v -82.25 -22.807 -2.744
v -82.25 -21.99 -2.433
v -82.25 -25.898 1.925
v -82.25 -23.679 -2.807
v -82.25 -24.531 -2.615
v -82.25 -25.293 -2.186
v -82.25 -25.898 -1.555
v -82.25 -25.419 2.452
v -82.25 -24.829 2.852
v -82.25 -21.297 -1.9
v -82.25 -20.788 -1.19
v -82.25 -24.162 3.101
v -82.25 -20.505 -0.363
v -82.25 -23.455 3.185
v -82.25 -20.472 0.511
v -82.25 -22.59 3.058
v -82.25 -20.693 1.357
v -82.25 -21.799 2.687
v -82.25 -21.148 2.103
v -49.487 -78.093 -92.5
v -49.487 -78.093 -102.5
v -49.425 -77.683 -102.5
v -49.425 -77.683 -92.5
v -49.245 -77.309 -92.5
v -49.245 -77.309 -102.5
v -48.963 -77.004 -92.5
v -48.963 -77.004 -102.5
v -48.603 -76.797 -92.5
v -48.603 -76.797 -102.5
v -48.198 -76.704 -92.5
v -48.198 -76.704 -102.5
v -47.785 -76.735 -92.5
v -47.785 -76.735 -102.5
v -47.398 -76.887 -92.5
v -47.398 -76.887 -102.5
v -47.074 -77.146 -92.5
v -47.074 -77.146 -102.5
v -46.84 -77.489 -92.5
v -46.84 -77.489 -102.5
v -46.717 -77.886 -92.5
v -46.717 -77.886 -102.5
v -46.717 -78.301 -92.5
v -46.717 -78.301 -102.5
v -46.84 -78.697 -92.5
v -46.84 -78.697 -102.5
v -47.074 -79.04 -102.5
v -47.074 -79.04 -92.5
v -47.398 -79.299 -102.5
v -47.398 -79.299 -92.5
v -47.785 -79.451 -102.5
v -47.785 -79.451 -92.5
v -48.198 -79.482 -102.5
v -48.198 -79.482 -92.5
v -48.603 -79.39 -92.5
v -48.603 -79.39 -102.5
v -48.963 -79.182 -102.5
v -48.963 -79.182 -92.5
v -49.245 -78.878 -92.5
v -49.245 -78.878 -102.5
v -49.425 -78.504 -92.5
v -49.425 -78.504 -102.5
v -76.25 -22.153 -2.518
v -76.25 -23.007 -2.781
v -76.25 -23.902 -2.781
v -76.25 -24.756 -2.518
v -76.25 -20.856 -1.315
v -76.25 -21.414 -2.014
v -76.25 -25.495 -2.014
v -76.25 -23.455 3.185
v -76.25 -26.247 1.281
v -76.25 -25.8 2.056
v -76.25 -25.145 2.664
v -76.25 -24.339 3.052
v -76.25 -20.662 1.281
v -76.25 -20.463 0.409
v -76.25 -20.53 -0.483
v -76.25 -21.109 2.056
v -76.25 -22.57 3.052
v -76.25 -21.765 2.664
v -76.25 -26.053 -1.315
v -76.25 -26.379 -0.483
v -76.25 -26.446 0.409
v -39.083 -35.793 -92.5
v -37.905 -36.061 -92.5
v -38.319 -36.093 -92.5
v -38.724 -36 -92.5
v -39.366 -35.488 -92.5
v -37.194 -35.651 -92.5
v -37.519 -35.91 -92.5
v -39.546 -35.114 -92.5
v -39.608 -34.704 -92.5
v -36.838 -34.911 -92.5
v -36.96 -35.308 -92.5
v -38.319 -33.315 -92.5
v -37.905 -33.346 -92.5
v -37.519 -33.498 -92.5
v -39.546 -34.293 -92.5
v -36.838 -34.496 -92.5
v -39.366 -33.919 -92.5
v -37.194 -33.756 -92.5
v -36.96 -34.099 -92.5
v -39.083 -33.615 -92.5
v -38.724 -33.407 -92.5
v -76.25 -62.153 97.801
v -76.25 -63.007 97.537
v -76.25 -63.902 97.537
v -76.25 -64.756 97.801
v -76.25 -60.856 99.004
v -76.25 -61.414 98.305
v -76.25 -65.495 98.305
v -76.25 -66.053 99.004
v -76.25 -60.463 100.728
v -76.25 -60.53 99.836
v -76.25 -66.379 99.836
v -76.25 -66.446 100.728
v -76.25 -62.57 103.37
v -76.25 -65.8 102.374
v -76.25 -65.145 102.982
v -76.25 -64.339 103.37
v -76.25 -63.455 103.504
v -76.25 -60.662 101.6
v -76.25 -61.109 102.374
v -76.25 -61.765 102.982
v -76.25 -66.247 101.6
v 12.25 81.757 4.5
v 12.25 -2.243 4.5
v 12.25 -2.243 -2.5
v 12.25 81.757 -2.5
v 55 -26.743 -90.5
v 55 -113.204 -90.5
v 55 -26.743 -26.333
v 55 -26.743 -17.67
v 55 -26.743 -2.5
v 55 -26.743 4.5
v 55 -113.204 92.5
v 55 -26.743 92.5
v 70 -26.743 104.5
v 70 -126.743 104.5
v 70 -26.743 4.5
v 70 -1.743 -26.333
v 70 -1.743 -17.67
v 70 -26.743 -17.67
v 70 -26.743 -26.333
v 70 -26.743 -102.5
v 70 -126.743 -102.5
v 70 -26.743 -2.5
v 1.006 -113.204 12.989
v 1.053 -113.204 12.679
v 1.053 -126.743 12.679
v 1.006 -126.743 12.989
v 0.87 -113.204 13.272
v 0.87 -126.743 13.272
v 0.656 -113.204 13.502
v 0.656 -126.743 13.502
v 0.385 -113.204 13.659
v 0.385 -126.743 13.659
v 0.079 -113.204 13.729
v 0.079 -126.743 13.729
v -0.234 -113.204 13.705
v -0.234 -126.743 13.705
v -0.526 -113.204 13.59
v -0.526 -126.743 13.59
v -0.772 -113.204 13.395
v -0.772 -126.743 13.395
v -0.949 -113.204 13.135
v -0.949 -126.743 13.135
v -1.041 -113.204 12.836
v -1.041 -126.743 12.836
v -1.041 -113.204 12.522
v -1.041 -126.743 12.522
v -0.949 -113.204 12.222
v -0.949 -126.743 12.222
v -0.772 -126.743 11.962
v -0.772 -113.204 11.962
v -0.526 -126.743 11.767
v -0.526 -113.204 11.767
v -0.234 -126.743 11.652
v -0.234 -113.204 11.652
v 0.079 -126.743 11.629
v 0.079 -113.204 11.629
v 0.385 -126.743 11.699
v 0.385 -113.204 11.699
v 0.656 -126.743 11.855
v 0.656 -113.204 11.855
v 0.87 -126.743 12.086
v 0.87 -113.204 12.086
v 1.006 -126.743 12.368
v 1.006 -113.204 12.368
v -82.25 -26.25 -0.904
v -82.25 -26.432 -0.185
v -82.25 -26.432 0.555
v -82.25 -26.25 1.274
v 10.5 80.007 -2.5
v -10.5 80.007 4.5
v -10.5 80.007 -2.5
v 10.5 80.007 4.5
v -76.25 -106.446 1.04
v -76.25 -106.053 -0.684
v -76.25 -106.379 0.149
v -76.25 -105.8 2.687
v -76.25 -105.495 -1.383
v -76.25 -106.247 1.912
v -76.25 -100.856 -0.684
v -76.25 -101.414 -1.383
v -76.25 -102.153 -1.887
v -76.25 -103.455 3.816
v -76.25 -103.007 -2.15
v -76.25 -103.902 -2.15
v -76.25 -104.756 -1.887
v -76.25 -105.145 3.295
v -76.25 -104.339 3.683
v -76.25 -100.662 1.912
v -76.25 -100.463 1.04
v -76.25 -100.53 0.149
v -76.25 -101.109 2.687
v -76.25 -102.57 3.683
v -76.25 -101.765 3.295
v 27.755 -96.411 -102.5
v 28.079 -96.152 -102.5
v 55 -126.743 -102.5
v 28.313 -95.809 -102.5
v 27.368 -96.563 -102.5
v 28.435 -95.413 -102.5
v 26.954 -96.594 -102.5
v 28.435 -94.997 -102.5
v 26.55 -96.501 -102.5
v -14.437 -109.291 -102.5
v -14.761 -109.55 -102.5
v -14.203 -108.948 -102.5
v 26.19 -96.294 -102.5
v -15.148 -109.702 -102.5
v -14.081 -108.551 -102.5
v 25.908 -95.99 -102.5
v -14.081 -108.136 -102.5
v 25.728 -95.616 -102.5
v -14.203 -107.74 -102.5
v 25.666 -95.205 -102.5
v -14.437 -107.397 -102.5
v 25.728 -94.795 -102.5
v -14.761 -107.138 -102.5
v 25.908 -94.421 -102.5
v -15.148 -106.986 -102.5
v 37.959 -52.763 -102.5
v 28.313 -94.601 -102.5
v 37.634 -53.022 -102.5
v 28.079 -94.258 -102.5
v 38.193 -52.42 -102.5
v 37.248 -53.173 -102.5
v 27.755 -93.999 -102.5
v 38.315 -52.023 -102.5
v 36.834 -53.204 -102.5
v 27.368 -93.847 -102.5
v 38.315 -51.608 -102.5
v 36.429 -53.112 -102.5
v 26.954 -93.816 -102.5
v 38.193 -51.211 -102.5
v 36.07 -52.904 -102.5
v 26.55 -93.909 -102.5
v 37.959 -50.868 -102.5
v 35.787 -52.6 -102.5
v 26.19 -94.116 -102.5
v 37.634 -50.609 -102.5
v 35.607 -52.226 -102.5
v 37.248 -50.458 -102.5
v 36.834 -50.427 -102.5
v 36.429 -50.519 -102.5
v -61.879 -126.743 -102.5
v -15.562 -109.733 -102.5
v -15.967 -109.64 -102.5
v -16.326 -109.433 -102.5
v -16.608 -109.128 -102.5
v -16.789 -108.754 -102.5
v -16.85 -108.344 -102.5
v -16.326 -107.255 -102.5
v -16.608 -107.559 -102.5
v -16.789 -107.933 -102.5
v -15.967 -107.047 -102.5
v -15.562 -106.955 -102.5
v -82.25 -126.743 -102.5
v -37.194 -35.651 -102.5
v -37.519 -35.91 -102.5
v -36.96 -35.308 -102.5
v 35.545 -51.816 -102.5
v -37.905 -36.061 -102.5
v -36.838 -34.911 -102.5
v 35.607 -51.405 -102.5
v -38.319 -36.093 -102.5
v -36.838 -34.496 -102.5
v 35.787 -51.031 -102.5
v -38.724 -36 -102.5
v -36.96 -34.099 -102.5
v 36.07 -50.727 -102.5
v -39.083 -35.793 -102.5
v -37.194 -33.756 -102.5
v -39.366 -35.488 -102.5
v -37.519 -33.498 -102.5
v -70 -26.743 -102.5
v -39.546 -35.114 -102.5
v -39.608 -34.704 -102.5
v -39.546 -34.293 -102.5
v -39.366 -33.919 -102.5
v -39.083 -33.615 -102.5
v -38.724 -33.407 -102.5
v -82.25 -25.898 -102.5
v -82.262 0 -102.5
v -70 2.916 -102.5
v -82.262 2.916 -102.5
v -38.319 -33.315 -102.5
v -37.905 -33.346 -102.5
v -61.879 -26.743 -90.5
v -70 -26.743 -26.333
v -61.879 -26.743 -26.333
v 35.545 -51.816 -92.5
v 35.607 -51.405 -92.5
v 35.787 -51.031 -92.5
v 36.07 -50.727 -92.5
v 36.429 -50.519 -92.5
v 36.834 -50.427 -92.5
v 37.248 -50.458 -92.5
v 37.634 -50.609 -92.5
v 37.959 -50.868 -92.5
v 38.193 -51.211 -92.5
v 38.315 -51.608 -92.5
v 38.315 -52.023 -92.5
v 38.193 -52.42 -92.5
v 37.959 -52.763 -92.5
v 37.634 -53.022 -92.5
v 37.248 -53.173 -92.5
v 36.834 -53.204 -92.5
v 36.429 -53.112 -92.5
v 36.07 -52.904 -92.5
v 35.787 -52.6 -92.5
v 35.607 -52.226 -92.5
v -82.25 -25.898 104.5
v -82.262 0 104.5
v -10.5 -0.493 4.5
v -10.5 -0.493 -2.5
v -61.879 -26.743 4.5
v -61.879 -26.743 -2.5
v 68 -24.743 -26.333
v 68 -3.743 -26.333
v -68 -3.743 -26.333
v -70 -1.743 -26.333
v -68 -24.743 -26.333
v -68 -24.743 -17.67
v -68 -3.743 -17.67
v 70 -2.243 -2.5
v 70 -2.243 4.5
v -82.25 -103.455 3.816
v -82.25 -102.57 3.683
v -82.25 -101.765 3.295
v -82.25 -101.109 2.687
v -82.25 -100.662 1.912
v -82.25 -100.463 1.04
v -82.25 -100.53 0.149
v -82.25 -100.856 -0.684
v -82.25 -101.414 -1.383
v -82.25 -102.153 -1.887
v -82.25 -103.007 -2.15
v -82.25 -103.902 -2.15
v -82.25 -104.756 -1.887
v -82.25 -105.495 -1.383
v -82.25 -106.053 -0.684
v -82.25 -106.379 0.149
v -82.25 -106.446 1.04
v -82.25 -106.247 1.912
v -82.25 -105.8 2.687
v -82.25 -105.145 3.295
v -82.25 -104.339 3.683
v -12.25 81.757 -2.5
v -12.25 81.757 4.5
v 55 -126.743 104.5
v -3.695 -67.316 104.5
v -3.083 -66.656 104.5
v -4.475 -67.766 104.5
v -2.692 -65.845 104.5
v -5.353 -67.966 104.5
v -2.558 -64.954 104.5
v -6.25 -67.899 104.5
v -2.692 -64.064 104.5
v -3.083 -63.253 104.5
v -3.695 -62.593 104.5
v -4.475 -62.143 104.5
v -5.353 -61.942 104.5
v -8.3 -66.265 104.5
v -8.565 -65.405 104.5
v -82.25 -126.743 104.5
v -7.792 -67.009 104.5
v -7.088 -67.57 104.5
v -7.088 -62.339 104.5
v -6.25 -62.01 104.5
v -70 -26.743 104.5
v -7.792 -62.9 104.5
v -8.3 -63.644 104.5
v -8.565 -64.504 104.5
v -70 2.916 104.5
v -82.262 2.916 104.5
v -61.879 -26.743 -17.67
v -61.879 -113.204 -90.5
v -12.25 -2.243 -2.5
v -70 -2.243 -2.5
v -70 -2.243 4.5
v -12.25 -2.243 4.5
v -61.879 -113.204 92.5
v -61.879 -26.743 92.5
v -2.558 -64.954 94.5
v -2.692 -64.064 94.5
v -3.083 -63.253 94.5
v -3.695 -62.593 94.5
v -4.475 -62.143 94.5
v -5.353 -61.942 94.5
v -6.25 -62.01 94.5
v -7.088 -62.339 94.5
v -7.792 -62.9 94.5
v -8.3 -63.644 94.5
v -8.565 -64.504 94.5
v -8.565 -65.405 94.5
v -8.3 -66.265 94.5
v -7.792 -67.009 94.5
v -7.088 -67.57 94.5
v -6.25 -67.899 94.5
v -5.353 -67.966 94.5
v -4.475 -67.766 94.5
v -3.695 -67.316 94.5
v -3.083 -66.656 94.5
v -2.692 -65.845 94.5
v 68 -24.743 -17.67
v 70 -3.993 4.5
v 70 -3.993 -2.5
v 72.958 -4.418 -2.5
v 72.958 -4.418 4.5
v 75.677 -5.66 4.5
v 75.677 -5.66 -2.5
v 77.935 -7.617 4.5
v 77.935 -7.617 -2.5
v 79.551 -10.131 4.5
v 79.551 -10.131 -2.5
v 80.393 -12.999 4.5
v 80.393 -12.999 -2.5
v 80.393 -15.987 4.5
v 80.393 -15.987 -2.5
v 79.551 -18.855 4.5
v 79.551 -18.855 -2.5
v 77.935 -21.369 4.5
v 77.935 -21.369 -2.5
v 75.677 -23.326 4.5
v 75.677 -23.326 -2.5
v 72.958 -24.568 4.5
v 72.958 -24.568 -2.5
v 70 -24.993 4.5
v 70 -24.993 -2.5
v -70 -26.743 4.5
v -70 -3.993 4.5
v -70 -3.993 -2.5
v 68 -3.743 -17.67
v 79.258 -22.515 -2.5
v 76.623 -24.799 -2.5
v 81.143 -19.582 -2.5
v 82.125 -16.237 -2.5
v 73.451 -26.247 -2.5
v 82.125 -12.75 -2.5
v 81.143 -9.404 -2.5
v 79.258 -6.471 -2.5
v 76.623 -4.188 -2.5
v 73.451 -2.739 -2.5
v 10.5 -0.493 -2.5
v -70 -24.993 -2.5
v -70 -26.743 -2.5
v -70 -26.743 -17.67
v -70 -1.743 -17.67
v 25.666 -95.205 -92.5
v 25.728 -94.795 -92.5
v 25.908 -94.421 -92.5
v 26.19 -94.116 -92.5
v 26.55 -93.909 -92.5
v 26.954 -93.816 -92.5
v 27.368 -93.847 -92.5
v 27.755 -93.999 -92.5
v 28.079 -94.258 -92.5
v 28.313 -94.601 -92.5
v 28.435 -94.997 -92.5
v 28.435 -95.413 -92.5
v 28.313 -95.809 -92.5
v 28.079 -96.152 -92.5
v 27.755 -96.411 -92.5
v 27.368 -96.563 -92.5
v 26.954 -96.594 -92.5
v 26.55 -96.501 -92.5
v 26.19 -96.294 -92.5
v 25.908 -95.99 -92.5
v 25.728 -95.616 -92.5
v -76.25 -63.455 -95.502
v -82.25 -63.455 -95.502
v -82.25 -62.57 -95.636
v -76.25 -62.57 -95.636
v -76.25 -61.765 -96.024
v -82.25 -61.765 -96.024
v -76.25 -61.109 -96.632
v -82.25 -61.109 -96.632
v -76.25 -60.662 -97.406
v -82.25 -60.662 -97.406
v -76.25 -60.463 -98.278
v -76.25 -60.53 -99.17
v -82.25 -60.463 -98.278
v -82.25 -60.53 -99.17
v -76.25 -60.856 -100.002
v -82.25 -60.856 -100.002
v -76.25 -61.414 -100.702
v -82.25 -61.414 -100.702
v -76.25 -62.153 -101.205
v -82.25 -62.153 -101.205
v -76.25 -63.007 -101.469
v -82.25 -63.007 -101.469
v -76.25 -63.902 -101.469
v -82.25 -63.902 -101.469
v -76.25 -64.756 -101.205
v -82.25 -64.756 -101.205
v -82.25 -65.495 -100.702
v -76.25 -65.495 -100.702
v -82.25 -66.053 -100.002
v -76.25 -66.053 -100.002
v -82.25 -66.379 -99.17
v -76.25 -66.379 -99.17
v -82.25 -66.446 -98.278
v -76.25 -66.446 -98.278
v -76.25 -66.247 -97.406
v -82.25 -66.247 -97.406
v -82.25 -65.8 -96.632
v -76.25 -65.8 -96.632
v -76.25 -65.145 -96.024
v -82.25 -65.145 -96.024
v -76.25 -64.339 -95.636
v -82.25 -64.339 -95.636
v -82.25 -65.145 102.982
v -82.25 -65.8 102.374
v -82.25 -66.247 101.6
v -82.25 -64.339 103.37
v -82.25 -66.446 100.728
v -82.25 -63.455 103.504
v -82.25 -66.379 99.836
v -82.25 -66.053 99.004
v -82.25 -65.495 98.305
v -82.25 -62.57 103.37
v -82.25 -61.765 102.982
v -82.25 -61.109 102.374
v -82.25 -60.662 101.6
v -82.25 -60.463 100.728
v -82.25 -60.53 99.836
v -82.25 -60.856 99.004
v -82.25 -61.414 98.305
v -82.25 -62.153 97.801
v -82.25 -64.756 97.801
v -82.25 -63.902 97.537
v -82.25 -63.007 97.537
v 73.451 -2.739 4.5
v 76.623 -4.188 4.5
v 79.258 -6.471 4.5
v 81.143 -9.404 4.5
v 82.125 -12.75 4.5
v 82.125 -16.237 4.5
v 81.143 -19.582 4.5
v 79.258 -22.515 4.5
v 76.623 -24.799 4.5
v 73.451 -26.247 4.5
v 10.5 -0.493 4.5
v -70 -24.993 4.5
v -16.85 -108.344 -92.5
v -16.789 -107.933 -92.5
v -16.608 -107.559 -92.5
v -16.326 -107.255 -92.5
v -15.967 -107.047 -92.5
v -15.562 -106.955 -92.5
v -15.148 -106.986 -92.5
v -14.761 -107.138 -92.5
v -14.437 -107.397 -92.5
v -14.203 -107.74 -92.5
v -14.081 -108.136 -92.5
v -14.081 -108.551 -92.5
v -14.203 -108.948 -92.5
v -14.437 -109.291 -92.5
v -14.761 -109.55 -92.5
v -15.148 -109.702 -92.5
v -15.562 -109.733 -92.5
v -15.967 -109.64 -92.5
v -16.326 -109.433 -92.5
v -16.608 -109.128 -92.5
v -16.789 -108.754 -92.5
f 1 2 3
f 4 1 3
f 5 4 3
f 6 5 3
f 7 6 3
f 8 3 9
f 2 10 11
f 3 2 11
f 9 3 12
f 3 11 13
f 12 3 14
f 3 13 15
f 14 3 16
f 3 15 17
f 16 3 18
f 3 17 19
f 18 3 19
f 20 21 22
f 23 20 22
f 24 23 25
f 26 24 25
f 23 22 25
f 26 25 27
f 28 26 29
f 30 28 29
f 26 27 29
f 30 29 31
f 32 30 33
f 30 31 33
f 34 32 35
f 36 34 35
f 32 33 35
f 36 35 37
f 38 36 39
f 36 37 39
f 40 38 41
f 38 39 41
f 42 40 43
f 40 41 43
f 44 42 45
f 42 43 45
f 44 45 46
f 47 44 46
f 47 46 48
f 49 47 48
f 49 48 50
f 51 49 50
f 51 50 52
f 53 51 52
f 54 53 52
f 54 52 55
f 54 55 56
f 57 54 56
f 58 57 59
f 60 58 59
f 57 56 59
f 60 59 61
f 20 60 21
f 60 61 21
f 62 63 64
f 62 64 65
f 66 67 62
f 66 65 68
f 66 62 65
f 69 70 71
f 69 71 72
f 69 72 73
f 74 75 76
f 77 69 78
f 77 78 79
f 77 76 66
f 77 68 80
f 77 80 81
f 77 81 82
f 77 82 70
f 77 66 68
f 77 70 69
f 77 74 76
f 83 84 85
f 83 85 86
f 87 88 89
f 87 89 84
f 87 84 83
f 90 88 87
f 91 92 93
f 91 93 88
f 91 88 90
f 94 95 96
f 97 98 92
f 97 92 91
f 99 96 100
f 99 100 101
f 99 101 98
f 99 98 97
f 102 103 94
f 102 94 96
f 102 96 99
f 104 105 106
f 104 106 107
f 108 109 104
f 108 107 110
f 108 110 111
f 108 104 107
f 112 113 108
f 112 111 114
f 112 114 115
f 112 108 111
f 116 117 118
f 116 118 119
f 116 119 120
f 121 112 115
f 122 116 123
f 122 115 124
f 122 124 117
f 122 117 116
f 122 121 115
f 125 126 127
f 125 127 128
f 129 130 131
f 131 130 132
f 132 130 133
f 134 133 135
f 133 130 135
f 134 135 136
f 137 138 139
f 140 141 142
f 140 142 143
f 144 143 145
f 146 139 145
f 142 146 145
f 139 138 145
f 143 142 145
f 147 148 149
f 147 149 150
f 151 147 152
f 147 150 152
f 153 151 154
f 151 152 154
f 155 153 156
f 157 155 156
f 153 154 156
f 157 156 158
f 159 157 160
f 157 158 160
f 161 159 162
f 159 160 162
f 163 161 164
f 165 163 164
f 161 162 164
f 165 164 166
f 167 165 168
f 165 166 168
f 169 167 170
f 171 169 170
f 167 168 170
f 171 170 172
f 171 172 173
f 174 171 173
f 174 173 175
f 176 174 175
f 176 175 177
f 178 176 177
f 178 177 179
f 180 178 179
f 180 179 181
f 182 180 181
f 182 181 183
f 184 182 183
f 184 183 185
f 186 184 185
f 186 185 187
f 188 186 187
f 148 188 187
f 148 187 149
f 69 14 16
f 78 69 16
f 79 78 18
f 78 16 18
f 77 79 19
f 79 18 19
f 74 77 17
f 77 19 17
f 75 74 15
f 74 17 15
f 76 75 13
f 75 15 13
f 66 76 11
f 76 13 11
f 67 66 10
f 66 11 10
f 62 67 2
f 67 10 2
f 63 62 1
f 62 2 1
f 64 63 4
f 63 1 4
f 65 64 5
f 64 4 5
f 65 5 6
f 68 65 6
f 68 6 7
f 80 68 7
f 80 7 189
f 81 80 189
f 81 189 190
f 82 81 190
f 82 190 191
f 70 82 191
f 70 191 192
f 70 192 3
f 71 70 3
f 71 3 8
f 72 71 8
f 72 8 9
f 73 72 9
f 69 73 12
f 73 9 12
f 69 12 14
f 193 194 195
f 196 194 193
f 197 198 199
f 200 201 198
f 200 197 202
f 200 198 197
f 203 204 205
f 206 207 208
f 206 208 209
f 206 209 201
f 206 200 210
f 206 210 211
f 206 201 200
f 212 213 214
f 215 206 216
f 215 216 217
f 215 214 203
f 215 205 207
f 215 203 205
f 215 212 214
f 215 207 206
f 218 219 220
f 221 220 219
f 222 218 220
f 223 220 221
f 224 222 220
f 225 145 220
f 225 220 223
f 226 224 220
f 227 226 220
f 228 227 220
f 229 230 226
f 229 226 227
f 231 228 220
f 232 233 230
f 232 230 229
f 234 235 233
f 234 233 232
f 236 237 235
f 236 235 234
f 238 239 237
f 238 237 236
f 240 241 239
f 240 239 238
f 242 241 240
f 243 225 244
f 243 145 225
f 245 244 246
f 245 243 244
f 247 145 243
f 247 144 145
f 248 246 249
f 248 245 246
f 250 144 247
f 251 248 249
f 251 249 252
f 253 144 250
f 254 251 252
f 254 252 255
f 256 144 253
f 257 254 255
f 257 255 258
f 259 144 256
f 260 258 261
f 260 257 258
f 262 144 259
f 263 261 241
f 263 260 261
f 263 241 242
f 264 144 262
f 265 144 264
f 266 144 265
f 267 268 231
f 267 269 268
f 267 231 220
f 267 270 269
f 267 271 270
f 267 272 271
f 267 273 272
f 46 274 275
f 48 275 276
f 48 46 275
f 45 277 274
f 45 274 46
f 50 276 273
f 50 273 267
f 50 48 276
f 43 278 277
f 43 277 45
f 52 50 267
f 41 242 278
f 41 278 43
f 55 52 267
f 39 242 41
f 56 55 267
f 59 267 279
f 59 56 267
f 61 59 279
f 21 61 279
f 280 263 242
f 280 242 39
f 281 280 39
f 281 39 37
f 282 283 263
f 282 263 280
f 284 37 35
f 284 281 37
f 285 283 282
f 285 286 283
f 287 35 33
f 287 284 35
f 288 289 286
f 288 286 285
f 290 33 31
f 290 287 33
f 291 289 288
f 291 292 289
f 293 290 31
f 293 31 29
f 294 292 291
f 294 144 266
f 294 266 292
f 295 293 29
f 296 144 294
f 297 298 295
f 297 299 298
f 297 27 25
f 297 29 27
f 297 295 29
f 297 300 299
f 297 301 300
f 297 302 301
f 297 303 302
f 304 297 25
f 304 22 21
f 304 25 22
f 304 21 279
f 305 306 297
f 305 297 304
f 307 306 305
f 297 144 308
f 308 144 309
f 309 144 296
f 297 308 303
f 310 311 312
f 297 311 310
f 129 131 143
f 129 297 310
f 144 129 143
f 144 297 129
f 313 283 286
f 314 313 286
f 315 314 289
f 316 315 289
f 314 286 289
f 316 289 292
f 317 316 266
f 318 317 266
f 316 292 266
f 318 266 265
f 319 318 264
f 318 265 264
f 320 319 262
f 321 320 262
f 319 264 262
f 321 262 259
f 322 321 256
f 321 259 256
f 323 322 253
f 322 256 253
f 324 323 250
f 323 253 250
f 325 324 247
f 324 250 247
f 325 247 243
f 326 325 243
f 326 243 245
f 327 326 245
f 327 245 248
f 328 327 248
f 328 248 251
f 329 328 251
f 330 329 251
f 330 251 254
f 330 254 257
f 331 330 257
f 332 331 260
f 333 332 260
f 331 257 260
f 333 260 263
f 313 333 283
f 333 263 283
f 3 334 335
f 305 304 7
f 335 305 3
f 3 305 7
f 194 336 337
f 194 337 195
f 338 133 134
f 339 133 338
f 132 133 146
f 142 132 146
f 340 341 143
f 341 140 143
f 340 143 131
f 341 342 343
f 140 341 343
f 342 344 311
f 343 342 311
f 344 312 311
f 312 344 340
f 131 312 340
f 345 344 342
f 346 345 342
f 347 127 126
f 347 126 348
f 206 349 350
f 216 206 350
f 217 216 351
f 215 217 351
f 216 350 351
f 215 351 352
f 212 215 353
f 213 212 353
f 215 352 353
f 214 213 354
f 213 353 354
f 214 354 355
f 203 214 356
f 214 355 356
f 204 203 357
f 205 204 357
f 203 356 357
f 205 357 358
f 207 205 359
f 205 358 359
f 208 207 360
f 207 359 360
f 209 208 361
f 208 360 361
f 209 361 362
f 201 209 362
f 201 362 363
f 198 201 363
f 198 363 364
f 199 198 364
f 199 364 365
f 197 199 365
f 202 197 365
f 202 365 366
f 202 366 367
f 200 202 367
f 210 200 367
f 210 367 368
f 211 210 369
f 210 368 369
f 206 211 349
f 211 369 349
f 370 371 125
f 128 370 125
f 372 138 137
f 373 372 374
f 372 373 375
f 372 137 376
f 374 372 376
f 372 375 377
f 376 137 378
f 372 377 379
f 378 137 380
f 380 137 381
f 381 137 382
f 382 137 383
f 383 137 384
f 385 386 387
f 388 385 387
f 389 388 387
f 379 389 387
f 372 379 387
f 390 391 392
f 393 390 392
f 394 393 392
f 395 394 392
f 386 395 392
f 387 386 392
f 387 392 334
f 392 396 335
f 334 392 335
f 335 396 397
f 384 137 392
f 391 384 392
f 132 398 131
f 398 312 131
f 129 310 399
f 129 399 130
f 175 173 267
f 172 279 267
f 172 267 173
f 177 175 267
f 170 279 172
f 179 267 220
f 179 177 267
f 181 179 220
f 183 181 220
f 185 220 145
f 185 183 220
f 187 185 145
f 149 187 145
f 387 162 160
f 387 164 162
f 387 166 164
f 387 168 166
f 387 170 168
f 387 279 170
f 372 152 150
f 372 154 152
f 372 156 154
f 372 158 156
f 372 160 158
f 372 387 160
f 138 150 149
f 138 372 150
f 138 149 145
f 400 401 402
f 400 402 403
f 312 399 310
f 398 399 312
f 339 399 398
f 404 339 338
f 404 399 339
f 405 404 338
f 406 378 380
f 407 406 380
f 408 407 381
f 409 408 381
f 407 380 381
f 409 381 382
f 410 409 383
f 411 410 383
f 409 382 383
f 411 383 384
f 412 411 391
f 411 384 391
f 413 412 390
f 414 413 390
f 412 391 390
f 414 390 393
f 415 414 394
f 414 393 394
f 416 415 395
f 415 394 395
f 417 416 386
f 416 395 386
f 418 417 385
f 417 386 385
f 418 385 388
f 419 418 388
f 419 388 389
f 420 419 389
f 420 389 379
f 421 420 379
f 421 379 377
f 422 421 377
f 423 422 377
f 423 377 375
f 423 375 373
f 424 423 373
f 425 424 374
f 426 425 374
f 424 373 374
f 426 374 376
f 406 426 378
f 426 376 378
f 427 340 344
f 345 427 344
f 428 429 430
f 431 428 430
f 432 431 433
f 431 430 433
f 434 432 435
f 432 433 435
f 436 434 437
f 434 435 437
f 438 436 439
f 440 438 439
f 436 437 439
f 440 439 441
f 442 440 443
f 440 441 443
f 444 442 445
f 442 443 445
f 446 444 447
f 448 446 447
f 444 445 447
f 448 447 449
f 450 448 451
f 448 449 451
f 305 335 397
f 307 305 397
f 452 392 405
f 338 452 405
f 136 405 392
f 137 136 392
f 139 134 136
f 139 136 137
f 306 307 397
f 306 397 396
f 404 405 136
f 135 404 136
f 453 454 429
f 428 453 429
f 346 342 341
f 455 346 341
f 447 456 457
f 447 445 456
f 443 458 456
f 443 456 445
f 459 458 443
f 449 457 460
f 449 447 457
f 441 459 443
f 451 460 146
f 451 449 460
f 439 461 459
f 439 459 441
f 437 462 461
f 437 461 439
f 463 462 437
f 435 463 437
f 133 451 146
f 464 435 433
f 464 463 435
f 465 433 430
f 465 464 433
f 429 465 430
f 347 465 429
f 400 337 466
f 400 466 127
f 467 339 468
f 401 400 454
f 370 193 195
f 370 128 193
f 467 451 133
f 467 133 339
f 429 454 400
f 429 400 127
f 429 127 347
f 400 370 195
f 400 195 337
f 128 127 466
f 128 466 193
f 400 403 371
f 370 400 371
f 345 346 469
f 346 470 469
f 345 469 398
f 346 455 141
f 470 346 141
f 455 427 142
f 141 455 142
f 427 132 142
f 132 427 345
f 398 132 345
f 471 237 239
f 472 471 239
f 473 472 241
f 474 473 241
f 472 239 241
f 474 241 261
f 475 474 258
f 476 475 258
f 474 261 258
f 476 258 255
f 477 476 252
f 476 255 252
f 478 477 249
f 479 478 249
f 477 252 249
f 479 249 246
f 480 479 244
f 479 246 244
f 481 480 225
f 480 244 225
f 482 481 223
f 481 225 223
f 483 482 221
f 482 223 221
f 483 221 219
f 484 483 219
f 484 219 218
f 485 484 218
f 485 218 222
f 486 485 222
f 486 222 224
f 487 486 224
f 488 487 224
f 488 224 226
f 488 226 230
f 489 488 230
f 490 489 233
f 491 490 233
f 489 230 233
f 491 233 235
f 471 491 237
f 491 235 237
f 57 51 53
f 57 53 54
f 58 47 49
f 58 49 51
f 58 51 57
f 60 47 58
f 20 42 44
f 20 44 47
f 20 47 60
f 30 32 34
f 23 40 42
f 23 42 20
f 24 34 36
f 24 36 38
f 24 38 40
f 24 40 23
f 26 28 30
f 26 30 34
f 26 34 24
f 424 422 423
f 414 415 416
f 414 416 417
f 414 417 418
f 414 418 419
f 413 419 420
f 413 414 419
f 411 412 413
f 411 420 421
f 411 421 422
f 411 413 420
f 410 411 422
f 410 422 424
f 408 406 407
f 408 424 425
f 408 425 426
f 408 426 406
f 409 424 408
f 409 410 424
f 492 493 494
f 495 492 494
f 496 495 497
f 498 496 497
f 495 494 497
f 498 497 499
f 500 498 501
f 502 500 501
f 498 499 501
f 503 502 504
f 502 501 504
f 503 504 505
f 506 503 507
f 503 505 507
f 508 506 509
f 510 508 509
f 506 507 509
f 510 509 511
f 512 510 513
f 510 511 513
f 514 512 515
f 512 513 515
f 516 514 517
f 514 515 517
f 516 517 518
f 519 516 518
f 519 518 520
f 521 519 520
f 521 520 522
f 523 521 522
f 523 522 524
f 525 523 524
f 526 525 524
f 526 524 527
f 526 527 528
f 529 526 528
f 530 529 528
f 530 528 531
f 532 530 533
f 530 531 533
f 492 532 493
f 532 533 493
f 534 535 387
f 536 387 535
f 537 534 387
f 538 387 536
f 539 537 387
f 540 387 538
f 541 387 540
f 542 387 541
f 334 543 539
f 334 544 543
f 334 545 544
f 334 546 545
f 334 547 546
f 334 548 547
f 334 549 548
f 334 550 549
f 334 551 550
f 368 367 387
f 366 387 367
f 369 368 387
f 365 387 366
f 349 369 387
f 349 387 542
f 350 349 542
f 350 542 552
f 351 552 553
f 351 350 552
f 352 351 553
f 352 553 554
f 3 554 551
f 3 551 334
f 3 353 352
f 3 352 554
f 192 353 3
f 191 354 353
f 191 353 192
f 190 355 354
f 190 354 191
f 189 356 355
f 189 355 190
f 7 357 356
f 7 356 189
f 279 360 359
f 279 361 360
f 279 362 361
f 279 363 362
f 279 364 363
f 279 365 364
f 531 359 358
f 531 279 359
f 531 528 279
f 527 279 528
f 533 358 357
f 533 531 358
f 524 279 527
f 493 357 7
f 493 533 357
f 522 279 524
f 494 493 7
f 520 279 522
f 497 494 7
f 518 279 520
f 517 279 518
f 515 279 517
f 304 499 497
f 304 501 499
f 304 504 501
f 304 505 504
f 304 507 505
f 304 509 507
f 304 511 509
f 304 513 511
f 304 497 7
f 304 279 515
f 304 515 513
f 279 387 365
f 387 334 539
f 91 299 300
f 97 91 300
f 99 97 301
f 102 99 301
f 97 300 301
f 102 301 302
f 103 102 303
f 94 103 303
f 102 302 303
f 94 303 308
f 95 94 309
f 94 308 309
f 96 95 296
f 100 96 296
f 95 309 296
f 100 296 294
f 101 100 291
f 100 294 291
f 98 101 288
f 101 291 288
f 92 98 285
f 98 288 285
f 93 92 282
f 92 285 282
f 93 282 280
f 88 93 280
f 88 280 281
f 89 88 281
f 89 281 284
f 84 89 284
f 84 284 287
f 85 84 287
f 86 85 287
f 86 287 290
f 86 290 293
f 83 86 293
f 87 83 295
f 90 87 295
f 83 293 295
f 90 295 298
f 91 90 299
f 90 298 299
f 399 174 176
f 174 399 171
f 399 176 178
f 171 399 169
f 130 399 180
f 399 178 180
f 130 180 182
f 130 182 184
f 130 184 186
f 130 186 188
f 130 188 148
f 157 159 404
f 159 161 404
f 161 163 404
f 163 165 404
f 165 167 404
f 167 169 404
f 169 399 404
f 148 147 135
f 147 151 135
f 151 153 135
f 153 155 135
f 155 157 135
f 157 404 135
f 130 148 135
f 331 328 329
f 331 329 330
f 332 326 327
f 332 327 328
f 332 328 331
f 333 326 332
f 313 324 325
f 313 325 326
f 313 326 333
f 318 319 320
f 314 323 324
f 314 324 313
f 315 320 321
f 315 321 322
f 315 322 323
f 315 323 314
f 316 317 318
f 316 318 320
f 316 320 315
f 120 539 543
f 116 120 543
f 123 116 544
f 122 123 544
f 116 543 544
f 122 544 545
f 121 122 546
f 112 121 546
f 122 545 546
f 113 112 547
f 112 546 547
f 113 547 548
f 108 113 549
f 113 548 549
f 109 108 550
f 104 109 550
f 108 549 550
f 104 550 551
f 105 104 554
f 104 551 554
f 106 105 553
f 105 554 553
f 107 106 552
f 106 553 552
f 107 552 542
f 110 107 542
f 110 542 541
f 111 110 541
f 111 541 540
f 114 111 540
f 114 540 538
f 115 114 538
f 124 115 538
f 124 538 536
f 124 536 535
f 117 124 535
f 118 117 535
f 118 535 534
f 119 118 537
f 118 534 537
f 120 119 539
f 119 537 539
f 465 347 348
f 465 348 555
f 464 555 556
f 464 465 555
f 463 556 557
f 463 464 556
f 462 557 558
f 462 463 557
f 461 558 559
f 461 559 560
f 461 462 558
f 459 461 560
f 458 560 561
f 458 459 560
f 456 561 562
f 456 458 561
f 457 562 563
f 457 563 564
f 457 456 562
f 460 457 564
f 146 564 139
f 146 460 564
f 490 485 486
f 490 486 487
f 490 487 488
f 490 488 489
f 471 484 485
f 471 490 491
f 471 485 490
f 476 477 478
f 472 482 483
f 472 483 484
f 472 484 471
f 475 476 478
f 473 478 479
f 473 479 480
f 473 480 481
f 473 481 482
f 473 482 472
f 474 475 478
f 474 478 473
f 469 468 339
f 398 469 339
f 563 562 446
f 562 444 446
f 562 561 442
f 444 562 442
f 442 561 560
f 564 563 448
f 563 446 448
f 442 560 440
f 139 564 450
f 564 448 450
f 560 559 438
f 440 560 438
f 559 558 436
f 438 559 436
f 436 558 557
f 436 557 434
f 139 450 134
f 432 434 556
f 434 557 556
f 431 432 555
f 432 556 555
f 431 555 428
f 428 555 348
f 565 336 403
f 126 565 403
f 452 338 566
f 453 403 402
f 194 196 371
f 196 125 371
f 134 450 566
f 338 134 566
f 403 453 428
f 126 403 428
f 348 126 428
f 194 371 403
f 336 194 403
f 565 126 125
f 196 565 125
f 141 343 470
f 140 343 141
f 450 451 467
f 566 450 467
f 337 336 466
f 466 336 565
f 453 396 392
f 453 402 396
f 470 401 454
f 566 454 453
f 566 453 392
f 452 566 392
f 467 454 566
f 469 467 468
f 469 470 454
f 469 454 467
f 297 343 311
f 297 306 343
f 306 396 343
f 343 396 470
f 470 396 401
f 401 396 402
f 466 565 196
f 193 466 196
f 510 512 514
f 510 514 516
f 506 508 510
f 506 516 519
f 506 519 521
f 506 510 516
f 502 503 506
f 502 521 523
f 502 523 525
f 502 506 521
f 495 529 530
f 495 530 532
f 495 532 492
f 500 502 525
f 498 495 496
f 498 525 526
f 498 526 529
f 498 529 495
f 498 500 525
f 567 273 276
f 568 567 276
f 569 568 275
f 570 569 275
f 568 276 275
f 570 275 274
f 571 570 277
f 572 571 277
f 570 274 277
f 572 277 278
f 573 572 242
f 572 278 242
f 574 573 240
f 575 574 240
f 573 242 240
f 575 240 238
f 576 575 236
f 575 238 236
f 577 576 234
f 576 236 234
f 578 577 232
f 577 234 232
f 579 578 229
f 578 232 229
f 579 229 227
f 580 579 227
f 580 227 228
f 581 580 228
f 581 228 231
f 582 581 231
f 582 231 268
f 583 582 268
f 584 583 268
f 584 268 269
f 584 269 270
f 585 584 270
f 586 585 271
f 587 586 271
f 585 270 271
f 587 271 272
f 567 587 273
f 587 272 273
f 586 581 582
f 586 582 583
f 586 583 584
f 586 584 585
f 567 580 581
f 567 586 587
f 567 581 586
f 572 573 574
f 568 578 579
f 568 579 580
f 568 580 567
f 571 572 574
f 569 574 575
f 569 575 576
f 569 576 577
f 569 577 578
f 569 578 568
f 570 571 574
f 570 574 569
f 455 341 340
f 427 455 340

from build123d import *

# Parameters (mm, degrees)
EXTRUDE_1_DEPTH      = 2
SKETCH_2_W           = 7
SKETCH_2_H           = 24
SKETCH_2_W_2         = 6
SKETCH_2_H_2         = 23
EXTRUDE_2_DEPTH      = 2
SCALE_1_SCALE        = 3.5
SKETCH_4_W           = 15
SKETCH_4_H           = 100
EXTRUDE_3_DEPTH      = 100
EXTRUDE_3_DEPTH_BACK = 107
SKETCH_5_W           = 116.879299814
SKETCH_5_H           = 13.538789425
EXTRUDE_4_DEPTH      = 207
SKETCH_6_W           = 116.879299814
SKETCH_6_H           = 12
EXTRUDE_5_DEPTH      = 100
EXTRUDE_9_DEPTH      = 25
CUT_EXTRUDE_7_DEPTH  = 20
EXTRUDE_10_DEPTH     = 207
SKETCH_17_R          = 3
CUT_EXTRUDE_8_DEPTH  = 6
SKETCH_22_R          = 1.052884015
CUT_EXTRUDE_9_DEPTH  = 209.5
SKETCH_23_R          = 3.020401844
CUT_EXTRUDE_10_DEPTH = 10
SKETCH_25_R          = 1.39267654
CUT_EXTRUDE_11_DEPTH = 10


with BuildPart() as part:
    # 草图1 → 凸台-拉伸1 (new body)
    with BuildSketch(Plane.XY):
        with BuildLine():
            Line((20, -3.5), (-20, -3.5))
            ThreePointArc((-20, -3.5), (-23.5, 0), (-20, 3.5))
            Line((-20, 3.5), (20, 3.5))
            ThreePointArc((20, 3.5), (23.5, 0), (20, -3.5))
        make_face()
        with BuildLine():
            Line((20, -3), (-20, -3))
            ThreePointArc((-20, -3), (-23, 0), (-20, 3))
            Line((-20, 3), (20, 3))
            ThreePointArc((20, 3), (23, 0), (20, -3))
        make_face(mode=Mode.SUBTRACT)
    extrude(amount=EXTRUDE_1_DEPTH)

    # 草图2 → 凸台-拉伸2 (add)
    with BuildSketch(Plane.XY.offset(2)):
        with Locations((0, 15.5)):
            Rectangle(SKETCH_2_W, SKETCH_2_H)
        with Locations((0, 15.5)):
            Rectangle(SKETCH_2_W_2, SKETCH_2_H_2, mode=Mode.SUBTRACT)
    extrude(amount=-EXTRUDE_2_DEPTH)


with BuildPart() as part_1:
    # 缩放比例1: scaled about (0, 5.797269405, 1)
    add(part.part.scale(SCALE_1_SCALE).moved(Location((0, -14.493173513, -2.5))))

    # 草图4 → 凸台-拉伸3 (add, two sides)
    with BuildSketch(Plane.XY.offset(4.5)) as extrude_3_sk:
        with Locations((62.5, -76.743173512)):
            Rectangle(SKETCH_4_W, SKETCH_4_H)
        with BuildLine():
            Line((-82.25, -14.493173512), (-82.25, -126.743173512))
            Line((-82.25, -126.743173512), (-61.879299814, -126.743173512))
            Line((-61.879299814, -126.743173512), (-61.879299814, -26.743173512))
            Line((-61.879299814, -26.743173512), (-70, -26.743173512))
            ThreePointArc((-70, -26.743173512), (-78.66205807, -23.155231582), (-82.25, -14.493173512))
        make_face()
    extrude(amount=EXTRUDE_3_DEPTH)
    extrude(extrude_3_sk.sketch, amount=-EXTRUDE_3_DEPTH_BACK)

    # 草图5 → 凸台-拉伸4 (add)
    with BuildSketch(Plane.XY.offset(104.5)):
        with Locations((-3.439649907, -119.9737788)):
            Rectangle(SKETCH_5_W, SKETCH_5_H)
    extrude(amount=-EXTRUDE_4_DEPTH)

    # 草图6 → 凸台-拉伸5 (add)
    with BuildSketch(Plane(origin=(0, -26.743173512, 0), x_dir=(1, 0, 0), z_dir=(0, 1, 0))):
        with Locations((-3.439649907, 96.5)):
            Rectangle(SKETCH_6_W, SKETCH_6_H)
        with Locations((-3.439649907, -98.5)):
            Rectangle(SKETCH_6_W, SKETCH_6_H)
    extrude(amount=-EXTRUDE_5_DEPTH)

    # 草图13 → 凸台-拉伸9 (add)
    with BuildSketch(Plane(origin=(0, -26.743173512, 0), x_dir=(1, 0, 0), z_dir=(0, 1, 0))):
        Polygon((-61.879299814, 17.670485576), (70, 17.670485576), (70, 26.332926598), (-61.879299814, 26.332926598), (-70, 26.332926598), (-70, 17.670485576), align=None)
    extrude(amount=EXTRUDE_9_DEPTH)

    # 草图15 → 切除-拉伸7 (cut)
    with BuildSketch(Plane(origin=(0, 0, -26.332926598), x_dir=(-1, 0, 0), z_dir=(0, 0, -1))):
        Polygon((-68, -24.743173512), (-55, -24.743173512), (61.879299814, -24.743173512), (68, -24.743173512), (68, -3.743173512), (-68, -3.743173512), align=None)
    extrude(amount=-CUT_EXTRUDE_7_DEPTH, mode=Mode.SUBTRACT)

    # 草图16 → 凸台-拉伸10 (add)
    with BuildSketch(Plane(origin=(0, 0, -102.5), x_dir=(-1, 0, 0), z_dir=(0, 0, -1))):
        Polygon((70, 2.916238078), (70, -10.049559482), (70, -26.598724572), (70, -27.524233973), (82.25, -27.524233973), (82.25, -25.898140615), (82.262032783, 0), (82.262032783, 2.916238078), align=None)
    extrude(amount=-EXTRUDE_10_DEPTH)

    # 草图17 → 切除-拉伸8 (cut)
    with BuildSketch(Plane.ZY.offset(82.25)):
        with Locations((100.503767222, -63.454563981)):
            Circle(SKETCH_17_R)
        with Locations((0.185055836, -23.454563981)):
            Circle(SKETCH_17_R)
        with Locations((-98.502426721, -63.454563981)):
            Circle(SKETCH_17_R)
        with Locations((0.816253539, -103.454563981)):
            Circle(SKETCH_17_R)
    extrude(amount=-CUT_EXTRUDE_8_DEPTH, mode=Mode.SUBTRACT)

    # 草图22 → 切除-拉伸9 (cut, through all)
    with BuildSketch(Plane.XZ.offset(126.743173512)):
        with Locations((0, 12.678619429)):
            Circle(SKETCH_22_R)
    extrude(amount=-CUT_EXTRUDE_9_DEPTH, mode=Mode.SUBTRACT)

    # 草图23 → 切除-拉伸10 (cut)
    with BuildSketch(Plane.XY.offset(104.5)):
        with Locations((-5.57826907, -64.954384087)):
            Circle(SKETCH_23_R)
    extrude(amount=-CUT_EXTRUDE_10_DEPTH, mode=Mode.SUBTRACT)

    # 草图25 → 切除-拉伸11 (cut)
    with BuildSketch(Plane(origin=(0, 0, -102.5), x_dir=(-1, 0, 0), z_dir=(0, 0, -1))):
        with Locations((-36.937867187, -51.815580574)):
            Circle(SKETCH_25_R)
        with Locations((-4.301261441, -21.564928261)):
            Circle(SKETCH_25_R)
        with Locations((38.214874816, -34.703731774)):
            Circle(SKETCH_25_R)
        with Locations((48.094405328, -78.0931876)):
            Circle(SKETCH_25_R)
        with Locations((15.457799582, -108.343839913)):
            Circle(SKETCH_25_R)
        with Locations((-27.058336676, -95.2050364)):
            Circle(SKETCH_25_R)
    extrude(amount=-CUT_EXTRUDE_11_DEPTH, mode=Mode.SUBTRACT)


solid = part_1.part
